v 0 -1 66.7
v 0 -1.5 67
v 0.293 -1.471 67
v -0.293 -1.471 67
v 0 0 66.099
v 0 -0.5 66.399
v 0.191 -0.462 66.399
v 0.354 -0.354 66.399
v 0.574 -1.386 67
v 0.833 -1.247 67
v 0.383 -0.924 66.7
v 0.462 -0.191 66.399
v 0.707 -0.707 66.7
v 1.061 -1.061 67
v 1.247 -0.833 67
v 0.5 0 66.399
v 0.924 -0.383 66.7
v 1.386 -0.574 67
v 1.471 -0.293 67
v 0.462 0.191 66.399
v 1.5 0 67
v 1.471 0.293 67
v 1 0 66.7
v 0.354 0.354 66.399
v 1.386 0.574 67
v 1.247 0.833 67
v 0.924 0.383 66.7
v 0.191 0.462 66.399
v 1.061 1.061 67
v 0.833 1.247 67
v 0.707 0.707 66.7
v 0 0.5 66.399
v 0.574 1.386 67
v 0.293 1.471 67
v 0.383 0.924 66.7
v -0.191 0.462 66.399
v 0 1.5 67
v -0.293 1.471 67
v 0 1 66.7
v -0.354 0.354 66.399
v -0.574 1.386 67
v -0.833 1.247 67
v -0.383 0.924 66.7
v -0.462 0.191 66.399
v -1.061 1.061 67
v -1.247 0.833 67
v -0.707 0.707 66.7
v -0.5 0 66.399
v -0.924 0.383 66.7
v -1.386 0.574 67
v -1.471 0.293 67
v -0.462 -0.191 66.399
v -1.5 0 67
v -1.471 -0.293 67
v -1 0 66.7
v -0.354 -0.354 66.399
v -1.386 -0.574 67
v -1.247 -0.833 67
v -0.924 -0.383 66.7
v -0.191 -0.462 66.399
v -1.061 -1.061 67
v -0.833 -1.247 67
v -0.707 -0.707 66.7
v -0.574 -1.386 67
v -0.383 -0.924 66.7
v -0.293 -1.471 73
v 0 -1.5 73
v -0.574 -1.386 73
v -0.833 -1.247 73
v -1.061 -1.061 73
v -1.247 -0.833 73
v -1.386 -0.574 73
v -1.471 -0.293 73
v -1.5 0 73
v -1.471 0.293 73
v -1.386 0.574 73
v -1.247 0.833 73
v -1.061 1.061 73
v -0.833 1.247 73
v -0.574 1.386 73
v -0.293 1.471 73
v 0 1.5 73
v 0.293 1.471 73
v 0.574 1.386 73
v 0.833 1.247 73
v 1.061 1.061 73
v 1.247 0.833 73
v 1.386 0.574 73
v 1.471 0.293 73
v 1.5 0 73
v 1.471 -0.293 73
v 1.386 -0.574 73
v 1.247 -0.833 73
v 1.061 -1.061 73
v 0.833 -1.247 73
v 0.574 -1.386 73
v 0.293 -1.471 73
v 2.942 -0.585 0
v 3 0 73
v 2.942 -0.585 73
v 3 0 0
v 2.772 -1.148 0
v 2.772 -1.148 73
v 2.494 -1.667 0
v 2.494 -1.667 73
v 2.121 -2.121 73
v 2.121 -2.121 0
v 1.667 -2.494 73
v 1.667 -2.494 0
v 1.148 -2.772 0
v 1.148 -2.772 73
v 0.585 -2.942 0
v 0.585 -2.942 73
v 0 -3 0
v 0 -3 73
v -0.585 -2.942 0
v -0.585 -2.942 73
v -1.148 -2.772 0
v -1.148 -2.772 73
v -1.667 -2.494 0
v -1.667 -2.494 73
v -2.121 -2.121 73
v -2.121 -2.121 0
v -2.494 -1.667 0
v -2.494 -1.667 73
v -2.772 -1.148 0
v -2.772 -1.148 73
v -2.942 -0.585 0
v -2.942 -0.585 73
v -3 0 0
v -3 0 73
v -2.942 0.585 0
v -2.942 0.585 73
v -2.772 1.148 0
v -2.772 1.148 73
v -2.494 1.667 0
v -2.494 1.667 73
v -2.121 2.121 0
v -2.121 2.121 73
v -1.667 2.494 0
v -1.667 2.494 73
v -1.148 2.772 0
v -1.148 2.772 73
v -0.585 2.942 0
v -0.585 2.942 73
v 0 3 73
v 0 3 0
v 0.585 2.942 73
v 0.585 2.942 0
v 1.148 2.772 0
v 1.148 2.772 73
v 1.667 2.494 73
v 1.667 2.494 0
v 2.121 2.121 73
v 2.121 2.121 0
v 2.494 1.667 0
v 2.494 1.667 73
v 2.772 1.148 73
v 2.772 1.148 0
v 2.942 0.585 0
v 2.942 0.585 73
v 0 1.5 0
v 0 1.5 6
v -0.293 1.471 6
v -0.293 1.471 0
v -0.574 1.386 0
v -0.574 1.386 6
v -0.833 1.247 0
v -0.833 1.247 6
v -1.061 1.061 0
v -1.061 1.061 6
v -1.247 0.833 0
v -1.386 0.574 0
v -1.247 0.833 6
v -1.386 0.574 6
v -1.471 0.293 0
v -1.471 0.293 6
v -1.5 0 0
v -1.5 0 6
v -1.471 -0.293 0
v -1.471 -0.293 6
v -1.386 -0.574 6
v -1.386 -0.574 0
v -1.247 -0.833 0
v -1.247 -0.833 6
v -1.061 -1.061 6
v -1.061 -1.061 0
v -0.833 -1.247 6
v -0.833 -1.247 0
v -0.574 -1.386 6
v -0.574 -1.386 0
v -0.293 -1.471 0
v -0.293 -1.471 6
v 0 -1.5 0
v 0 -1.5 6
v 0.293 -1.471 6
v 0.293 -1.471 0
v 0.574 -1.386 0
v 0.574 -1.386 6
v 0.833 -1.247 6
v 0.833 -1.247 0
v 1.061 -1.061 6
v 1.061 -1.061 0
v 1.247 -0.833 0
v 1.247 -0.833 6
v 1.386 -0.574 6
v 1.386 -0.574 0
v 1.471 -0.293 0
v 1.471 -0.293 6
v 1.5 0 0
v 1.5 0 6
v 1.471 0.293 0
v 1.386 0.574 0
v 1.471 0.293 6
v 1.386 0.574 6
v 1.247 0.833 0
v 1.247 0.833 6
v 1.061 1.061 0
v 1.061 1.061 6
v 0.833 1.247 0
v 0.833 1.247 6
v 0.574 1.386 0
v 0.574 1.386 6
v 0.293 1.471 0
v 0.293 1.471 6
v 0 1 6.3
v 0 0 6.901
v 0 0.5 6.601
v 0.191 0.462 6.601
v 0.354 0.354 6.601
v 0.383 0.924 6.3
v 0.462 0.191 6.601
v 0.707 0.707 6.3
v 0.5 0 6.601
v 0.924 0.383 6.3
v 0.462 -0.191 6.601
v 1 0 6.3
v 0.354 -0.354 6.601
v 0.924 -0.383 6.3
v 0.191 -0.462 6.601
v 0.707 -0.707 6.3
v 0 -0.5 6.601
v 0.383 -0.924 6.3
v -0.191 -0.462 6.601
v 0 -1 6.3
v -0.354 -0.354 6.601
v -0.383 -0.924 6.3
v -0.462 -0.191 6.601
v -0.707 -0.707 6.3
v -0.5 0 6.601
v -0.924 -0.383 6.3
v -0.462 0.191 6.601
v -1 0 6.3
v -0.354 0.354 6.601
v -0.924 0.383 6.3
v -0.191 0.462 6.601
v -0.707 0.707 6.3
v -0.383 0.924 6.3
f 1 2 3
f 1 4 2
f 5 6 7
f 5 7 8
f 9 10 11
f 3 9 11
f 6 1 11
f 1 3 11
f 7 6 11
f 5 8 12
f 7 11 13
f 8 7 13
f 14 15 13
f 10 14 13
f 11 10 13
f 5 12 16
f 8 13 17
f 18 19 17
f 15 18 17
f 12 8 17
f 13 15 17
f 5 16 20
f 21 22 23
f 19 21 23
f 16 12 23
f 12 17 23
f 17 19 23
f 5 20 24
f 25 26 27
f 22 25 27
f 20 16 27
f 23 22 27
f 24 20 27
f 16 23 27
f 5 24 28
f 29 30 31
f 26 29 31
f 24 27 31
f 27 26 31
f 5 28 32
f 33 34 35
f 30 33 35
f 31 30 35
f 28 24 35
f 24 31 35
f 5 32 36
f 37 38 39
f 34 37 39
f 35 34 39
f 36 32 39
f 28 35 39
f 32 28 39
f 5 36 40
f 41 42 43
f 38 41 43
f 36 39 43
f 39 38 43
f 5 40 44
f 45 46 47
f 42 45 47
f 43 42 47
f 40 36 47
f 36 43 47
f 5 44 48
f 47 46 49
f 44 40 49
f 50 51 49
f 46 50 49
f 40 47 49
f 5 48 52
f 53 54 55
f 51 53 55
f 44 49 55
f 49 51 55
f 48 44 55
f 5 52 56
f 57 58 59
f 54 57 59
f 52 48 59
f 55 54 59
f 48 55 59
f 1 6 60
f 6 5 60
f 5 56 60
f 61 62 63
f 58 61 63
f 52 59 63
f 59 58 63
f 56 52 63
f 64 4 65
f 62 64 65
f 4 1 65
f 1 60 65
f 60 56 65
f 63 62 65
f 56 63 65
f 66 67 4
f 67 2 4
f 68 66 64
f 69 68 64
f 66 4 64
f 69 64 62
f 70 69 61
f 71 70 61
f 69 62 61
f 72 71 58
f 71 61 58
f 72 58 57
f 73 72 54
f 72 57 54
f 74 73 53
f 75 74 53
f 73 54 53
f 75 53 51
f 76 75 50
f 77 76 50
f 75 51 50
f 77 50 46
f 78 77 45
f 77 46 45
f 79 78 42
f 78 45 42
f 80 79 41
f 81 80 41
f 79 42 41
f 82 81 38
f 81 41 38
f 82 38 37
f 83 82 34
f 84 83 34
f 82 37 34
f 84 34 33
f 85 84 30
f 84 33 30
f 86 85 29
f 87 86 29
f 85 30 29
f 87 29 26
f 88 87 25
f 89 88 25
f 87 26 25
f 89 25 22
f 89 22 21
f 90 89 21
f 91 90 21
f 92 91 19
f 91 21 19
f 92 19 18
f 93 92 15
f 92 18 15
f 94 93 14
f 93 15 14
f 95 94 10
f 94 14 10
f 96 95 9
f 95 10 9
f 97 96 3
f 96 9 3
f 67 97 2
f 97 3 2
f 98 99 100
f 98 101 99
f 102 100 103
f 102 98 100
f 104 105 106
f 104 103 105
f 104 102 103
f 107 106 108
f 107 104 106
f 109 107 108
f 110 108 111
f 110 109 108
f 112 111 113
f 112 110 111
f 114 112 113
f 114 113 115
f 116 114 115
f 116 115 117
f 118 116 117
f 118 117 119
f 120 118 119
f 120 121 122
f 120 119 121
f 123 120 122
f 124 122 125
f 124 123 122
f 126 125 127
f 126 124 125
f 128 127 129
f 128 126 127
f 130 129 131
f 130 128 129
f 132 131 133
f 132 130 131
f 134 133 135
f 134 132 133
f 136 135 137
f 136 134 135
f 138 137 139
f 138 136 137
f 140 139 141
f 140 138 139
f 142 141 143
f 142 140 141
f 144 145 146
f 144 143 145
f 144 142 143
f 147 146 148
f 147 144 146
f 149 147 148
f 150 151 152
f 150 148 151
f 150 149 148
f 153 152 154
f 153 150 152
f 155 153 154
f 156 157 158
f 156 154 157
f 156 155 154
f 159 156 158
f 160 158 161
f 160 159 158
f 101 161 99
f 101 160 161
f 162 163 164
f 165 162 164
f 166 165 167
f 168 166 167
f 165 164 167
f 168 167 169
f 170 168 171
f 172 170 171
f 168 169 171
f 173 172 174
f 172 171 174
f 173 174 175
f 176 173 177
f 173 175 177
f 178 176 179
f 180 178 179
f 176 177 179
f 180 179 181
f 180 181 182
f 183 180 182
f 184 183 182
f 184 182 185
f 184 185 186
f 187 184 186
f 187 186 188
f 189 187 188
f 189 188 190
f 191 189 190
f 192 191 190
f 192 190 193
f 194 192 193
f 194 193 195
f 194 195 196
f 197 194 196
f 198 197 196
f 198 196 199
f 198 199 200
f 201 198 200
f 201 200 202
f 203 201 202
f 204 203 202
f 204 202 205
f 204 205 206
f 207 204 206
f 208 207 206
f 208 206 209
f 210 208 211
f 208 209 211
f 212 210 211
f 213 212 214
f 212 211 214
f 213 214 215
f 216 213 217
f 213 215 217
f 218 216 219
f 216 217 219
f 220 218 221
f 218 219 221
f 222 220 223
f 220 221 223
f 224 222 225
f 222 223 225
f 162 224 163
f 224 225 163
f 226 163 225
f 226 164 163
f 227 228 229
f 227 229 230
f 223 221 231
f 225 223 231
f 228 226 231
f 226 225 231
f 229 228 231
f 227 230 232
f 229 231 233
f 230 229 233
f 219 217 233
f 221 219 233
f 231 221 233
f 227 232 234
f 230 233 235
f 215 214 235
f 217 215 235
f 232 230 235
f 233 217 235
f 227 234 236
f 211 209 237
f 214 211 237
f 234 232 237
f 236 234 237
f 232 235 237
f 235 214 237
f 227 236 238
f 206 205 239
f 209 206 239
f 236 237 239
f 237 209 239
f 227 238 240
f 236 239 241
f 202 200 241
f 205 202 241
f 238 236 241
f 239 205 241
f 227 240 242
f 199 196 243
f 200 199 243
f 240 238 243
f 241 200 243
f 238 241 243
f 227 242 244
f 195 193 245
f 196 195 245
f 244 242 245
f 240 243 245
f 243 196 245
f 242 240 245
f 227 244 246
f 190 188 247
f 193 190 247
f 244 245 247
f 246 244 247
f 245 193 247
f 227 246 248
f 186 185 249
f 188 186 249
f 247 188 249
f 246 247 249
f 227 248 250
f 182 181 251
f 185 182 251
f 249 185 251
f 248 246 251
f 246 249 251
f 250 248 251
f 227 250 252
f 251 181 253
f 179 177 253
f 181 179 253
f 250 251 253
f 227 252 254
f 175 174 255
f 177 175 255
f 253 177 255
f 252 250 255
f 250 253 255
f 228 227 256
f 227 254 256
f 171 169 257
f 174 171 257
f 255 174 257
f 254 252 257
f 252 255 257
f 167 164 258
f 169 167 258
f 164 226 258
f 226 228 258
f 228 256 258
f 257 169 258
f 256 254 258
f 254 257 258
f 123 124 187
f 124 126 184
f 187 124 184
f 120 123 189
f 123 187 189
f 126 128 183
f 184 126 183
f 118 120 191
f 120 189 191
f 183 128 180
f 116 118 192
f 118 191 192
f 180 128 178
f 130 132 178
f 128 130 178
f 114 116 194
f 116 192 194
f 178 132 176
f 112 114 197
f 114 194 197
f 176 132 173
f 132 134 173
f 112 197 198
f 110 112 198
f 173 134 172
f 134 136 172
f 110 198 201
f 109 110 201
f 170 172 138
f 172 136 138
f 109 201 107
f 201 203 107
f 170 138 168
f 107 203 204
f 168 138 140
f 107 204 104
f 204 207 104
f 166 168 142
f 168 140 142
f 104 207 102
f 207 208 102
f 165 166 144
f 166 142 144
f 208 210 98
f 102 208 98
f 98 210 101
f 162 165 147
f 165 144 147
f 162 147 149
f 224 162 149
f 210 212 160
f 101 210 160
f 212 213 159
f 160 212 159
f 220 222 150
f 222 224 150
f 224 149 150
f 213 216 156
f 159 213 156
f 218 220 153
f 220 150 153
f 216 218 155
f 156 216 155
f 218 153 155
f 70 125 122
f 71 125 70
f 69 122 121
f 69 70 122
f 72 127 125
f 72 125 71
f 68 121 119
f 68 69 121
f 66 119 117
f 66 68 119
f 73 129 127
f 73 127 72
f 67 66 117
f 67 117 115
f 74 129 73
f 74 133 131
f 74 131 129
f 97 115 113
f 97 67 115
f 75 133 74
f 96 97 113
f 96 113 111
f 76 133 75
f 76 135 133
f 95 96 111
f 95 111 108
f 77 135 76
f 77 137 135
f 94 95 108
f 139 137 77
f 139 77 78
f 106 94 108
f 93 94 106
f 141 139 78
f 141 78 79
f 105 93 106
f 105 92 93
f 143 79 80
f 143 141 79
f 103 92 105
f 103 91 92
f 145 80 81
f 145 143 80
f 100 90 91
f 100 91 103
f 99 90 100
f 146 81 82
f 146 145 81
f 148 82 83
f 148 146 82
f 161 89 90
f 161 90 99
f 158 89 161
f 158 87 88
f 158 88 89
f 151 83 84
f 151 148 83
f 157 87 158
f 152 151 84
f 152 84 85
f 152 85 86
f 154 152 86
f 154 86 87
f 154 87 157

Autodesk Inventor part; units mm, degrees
ref_plane "YZ Plane" through (0, 0, 0) normal (1, 0, 0) x (0, 1, 0)
ref_plane "XZ Plane" through (0, 0, 0) normal (0, 1, 0) x (-1, 0, 0)
ref_plane "XY Plane" through (0, 0, 0) normal (0, 0, 1) x (1, 0, 0)
sketch "スケッチ1" plane through (0, 0, 0) normal (0, 0, 1) x (1, 0, 0)
  circle A0 centre (0, 0) radius 3
  circle A1 centre (0, 0) radius 1.5005
  dimension "d0" = 6
  dimension "d1" = 3.001
extrude "押し出し1" add sketch "スケッチ1" along normal blind 73
sketch "スケッチ2" plane through (0, 0, 73) normal (0, 0, 1) x (1, 0, 0)
  circle A0 centre (0, 0) radius 1.5005 projected
  circle A1 centre (0, 0) radius 1.5
  dimension "d4" = 3
extrude "押し出し2" add sketch "スケッチ2" against normal blind 73
hole "穴1" at (0, 0, 73) direction (0, 0, -1) diameter 3 depth 6 tip angle 118
hole "穴2" at (0, 0, 0) direction (0, 0, 1) diameter 3 depth 6 tip angle 118
properties part number "スペーサーm3-73　簡易筒型" material "アルミニウム 2014-T4"
